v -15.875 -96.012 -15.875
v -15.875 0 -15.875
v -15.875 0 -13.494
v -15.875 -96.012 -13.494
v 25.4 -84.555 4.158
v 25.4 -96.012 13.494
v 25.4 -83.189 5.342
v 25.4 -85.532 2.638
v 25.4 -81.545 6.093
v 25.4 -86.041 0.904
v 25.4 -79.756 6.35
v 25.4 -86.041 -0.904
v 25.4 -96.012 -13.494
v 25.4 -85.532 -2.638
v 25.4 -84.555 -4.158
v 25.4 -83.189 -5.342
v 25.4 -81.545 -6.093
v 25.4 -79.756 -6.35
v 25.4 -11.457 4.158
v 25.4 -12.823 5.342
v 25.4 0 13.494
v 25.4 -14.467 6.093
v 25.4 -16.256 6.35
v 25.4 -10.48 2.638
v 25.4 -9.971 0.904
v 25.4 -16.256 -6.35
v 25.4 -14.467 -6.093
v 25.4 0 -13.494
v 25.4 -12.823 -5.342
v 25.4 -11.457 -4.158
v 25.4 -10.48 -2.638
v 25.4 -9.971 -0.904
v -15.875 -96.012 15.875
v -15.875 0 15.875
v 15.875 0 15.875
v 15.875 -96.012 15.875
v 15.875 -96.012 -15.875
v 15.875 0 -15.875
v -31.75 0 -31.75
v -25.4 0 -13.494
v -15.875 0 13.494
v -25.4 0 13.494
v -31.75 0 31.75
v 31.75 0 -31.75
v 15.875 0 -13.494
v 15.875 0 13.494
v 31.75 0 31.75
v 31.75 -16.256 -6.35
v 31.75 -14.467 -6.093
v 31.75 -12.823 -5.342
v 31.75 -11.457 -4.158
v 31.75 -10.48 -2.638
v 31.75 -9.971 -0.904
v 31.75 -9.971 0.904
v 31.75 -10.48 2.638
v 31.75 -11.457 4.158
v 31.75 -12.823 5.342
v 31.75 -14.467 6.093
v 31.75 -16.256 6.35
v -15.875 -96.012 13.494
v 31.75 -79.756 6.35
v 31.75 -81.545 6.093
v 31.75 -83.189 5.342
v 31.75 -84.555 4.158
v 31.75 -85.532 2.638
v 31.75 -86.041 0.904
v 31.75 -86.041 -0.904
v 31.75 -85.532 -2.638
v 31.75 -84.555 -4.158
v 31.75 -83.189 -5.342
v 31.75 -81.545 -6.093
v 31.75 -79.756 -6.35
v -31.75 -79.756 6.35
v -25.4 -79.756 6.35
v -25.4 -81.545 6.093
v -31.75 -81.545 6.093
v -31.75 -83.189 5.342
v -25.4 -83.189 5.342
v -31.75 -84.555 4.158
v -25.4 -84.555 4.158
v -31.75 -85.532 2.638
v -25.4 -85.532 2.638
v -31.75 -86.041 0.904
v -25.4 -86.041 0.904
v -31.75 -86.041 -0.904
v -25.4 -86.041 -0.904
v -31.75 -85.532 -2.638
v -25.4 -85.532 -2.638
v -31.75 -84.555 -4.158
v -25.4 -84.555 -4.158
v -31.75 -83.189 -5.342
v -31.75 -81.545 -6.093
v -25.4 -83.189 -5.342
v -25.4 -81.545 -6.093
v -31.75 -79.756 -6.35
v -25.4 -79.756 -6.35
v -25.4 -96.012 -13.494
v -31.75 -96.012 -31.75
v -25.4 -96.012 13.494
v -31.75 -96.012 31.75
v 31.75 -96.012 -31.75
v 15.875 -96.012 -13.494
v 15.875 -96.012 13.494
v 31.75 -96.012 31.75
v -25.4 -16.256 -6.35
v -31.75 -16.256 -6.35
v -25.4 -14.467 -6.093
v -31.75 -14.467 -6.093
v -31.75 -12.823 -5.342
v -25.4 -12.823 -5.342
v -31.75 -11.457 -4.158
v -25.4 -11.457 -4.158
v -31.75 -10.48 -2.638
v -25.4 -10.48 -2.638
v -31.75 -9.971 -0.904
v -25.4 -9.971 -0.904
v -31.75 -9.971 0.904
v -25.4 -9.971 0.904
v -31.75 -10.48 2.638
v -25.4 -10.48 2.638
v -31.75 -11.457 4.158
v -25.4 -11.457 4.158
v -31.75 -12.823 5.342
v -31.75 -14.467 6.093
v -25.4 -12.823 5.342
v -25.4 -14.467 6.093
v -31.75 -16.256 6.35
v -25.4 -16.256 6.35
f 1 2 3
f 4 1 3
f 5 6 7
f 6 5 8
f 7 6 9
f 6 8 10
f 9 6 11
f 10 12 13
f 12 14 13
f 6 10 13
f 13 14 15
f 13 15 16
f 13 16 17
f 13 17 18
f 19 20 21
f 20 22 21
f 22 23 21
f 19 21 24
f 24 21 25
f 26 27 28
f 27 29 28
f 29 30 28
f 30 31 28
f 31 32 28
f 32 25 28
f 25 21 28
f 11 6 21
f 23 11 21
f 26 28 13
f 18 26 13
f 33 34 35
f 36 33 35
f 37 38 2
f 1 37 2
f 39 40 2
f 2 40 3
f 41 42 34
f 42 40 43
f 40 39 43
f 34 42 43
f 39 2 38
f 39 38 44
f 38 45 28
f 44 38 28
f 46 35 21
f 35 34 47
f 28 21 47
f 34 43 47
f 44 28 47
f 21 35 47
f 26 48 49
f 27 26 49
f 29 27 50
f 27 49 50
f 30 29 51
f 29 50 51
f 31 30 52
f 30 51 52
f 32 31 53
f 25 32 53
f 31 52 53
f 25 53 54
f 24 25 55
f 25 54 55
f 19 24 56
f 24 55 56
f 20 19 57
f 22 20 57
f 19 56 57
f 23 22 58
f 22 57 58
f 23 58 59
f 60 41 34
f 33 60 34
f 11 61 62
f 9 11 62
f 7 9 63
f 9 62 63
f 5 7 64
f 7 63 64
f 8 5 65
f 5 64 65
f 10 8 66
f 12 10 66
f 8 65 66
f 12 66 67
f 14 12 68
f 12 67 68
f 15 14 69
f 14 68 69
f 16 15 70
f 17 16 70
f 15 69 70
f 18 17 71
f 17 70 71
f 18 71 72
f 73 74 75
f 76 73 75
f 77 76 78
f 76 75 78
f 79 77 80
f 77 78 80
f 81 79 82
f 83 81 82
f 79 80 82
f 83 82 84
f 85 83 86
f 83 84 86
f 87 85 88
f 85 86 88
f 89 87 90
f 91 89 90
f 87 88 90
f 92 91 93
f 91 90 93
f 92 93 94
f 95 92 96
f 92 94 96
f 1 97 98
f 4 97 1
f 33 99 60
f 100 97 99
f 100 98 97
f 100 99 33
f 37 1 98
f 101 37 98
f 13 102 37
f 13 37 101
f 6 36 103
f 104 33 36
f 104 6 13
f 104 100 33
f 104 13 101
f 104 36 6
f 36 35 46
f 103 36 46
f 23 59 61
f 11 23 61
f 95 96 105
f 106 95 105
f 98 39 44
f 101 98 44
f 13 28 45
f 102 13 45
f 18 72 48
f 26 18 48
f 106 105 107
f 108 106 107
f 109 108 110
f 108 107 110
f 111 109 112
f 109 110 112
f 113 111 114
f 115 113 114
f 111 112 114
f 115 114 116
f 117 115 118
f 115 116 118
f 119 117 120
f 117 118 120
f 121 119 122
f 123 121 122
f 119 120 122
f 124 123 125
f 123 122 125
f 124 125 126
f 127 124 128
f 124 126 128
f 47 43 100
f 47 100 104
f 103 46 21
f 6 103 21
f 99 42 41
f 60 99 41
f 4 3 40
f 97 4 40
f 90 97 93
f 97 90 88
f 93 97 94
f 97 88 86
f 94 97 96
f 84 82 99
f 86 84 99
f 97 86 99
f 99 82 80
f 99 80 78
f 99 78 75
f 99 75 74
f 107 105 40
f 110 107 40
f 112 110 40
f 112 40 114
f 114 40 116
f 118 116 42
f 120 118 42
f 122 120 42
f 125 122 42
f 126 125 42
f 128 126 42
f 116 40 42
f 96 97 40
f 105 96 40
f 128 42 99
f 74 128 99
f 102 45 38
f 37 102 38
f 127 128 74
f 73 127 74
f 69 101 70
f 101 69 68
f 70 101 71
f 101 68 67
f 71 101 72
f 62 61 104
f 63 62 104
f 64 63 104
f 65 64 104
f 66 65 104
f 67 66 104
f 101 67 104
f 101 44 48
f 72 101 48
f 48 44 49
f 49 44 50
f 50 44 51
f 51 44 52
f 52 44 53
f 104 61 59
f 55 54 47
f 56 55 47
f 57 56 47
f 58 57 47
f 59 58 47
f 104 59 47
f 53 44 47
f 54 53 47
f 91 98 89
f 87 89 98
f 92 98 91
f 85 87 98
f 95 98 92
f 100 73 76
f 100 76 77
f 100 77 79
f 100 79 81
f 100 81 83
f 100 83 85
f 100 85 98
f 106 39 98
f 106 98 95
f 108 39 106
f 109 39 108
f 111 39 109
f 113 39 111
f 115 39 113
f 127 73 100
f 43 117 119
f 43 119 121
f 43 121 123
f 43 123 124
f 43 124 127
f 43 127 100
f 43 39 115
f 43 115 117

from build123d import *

# Parameters (mm, degrees)
F0_W     = 63.5
F0_H     = 63.5
F1_DEPTH = 96.012
F3_DEPTH = 73.914


with BuildPart() as f1:
    # F0 (on Front) → F1 (new body)
    with BuildSketch(Plane.XZ):
        Rectangle(F0_W, F0_H)
        Polygon((-15.875, 15.875), (15.875, 15.875), (15.875, 13.49375), (25.4, 13.49375), (25.4, -13.49375), (15.875, -13.49375), (15.875, -15.875), (-15.875, -15.875), (-15.875, -13.49375), (-25.4, -13.49375), (-25.4, 13.49375), (-15.875, 13.49375), align=None, mode=Mode.SUBTRACT)
    extrude(amount=F1_DEPTH)

    # F2 (on face) → F3 (cut)
    with BuildSketch(Plane.YZ.offset(31.75)):
        with BuildLine():
            ThreePointArc((-79.756, 6.35), (-86.106, 0), (-79.756, -6.35))
            Line((-79.756, -6.35), (-16.256, -6.35))
            ThreePointArc((-16.256, -6.35), (-9.906, 0), (-16.256, 6.35))
            Line((-16.256, 6.35), (-79.756, 6.35))
        make_face()
    extrude(amount=-F3_DEPTH, mode=Mode.SUBTRACT)


solid = f1.part
